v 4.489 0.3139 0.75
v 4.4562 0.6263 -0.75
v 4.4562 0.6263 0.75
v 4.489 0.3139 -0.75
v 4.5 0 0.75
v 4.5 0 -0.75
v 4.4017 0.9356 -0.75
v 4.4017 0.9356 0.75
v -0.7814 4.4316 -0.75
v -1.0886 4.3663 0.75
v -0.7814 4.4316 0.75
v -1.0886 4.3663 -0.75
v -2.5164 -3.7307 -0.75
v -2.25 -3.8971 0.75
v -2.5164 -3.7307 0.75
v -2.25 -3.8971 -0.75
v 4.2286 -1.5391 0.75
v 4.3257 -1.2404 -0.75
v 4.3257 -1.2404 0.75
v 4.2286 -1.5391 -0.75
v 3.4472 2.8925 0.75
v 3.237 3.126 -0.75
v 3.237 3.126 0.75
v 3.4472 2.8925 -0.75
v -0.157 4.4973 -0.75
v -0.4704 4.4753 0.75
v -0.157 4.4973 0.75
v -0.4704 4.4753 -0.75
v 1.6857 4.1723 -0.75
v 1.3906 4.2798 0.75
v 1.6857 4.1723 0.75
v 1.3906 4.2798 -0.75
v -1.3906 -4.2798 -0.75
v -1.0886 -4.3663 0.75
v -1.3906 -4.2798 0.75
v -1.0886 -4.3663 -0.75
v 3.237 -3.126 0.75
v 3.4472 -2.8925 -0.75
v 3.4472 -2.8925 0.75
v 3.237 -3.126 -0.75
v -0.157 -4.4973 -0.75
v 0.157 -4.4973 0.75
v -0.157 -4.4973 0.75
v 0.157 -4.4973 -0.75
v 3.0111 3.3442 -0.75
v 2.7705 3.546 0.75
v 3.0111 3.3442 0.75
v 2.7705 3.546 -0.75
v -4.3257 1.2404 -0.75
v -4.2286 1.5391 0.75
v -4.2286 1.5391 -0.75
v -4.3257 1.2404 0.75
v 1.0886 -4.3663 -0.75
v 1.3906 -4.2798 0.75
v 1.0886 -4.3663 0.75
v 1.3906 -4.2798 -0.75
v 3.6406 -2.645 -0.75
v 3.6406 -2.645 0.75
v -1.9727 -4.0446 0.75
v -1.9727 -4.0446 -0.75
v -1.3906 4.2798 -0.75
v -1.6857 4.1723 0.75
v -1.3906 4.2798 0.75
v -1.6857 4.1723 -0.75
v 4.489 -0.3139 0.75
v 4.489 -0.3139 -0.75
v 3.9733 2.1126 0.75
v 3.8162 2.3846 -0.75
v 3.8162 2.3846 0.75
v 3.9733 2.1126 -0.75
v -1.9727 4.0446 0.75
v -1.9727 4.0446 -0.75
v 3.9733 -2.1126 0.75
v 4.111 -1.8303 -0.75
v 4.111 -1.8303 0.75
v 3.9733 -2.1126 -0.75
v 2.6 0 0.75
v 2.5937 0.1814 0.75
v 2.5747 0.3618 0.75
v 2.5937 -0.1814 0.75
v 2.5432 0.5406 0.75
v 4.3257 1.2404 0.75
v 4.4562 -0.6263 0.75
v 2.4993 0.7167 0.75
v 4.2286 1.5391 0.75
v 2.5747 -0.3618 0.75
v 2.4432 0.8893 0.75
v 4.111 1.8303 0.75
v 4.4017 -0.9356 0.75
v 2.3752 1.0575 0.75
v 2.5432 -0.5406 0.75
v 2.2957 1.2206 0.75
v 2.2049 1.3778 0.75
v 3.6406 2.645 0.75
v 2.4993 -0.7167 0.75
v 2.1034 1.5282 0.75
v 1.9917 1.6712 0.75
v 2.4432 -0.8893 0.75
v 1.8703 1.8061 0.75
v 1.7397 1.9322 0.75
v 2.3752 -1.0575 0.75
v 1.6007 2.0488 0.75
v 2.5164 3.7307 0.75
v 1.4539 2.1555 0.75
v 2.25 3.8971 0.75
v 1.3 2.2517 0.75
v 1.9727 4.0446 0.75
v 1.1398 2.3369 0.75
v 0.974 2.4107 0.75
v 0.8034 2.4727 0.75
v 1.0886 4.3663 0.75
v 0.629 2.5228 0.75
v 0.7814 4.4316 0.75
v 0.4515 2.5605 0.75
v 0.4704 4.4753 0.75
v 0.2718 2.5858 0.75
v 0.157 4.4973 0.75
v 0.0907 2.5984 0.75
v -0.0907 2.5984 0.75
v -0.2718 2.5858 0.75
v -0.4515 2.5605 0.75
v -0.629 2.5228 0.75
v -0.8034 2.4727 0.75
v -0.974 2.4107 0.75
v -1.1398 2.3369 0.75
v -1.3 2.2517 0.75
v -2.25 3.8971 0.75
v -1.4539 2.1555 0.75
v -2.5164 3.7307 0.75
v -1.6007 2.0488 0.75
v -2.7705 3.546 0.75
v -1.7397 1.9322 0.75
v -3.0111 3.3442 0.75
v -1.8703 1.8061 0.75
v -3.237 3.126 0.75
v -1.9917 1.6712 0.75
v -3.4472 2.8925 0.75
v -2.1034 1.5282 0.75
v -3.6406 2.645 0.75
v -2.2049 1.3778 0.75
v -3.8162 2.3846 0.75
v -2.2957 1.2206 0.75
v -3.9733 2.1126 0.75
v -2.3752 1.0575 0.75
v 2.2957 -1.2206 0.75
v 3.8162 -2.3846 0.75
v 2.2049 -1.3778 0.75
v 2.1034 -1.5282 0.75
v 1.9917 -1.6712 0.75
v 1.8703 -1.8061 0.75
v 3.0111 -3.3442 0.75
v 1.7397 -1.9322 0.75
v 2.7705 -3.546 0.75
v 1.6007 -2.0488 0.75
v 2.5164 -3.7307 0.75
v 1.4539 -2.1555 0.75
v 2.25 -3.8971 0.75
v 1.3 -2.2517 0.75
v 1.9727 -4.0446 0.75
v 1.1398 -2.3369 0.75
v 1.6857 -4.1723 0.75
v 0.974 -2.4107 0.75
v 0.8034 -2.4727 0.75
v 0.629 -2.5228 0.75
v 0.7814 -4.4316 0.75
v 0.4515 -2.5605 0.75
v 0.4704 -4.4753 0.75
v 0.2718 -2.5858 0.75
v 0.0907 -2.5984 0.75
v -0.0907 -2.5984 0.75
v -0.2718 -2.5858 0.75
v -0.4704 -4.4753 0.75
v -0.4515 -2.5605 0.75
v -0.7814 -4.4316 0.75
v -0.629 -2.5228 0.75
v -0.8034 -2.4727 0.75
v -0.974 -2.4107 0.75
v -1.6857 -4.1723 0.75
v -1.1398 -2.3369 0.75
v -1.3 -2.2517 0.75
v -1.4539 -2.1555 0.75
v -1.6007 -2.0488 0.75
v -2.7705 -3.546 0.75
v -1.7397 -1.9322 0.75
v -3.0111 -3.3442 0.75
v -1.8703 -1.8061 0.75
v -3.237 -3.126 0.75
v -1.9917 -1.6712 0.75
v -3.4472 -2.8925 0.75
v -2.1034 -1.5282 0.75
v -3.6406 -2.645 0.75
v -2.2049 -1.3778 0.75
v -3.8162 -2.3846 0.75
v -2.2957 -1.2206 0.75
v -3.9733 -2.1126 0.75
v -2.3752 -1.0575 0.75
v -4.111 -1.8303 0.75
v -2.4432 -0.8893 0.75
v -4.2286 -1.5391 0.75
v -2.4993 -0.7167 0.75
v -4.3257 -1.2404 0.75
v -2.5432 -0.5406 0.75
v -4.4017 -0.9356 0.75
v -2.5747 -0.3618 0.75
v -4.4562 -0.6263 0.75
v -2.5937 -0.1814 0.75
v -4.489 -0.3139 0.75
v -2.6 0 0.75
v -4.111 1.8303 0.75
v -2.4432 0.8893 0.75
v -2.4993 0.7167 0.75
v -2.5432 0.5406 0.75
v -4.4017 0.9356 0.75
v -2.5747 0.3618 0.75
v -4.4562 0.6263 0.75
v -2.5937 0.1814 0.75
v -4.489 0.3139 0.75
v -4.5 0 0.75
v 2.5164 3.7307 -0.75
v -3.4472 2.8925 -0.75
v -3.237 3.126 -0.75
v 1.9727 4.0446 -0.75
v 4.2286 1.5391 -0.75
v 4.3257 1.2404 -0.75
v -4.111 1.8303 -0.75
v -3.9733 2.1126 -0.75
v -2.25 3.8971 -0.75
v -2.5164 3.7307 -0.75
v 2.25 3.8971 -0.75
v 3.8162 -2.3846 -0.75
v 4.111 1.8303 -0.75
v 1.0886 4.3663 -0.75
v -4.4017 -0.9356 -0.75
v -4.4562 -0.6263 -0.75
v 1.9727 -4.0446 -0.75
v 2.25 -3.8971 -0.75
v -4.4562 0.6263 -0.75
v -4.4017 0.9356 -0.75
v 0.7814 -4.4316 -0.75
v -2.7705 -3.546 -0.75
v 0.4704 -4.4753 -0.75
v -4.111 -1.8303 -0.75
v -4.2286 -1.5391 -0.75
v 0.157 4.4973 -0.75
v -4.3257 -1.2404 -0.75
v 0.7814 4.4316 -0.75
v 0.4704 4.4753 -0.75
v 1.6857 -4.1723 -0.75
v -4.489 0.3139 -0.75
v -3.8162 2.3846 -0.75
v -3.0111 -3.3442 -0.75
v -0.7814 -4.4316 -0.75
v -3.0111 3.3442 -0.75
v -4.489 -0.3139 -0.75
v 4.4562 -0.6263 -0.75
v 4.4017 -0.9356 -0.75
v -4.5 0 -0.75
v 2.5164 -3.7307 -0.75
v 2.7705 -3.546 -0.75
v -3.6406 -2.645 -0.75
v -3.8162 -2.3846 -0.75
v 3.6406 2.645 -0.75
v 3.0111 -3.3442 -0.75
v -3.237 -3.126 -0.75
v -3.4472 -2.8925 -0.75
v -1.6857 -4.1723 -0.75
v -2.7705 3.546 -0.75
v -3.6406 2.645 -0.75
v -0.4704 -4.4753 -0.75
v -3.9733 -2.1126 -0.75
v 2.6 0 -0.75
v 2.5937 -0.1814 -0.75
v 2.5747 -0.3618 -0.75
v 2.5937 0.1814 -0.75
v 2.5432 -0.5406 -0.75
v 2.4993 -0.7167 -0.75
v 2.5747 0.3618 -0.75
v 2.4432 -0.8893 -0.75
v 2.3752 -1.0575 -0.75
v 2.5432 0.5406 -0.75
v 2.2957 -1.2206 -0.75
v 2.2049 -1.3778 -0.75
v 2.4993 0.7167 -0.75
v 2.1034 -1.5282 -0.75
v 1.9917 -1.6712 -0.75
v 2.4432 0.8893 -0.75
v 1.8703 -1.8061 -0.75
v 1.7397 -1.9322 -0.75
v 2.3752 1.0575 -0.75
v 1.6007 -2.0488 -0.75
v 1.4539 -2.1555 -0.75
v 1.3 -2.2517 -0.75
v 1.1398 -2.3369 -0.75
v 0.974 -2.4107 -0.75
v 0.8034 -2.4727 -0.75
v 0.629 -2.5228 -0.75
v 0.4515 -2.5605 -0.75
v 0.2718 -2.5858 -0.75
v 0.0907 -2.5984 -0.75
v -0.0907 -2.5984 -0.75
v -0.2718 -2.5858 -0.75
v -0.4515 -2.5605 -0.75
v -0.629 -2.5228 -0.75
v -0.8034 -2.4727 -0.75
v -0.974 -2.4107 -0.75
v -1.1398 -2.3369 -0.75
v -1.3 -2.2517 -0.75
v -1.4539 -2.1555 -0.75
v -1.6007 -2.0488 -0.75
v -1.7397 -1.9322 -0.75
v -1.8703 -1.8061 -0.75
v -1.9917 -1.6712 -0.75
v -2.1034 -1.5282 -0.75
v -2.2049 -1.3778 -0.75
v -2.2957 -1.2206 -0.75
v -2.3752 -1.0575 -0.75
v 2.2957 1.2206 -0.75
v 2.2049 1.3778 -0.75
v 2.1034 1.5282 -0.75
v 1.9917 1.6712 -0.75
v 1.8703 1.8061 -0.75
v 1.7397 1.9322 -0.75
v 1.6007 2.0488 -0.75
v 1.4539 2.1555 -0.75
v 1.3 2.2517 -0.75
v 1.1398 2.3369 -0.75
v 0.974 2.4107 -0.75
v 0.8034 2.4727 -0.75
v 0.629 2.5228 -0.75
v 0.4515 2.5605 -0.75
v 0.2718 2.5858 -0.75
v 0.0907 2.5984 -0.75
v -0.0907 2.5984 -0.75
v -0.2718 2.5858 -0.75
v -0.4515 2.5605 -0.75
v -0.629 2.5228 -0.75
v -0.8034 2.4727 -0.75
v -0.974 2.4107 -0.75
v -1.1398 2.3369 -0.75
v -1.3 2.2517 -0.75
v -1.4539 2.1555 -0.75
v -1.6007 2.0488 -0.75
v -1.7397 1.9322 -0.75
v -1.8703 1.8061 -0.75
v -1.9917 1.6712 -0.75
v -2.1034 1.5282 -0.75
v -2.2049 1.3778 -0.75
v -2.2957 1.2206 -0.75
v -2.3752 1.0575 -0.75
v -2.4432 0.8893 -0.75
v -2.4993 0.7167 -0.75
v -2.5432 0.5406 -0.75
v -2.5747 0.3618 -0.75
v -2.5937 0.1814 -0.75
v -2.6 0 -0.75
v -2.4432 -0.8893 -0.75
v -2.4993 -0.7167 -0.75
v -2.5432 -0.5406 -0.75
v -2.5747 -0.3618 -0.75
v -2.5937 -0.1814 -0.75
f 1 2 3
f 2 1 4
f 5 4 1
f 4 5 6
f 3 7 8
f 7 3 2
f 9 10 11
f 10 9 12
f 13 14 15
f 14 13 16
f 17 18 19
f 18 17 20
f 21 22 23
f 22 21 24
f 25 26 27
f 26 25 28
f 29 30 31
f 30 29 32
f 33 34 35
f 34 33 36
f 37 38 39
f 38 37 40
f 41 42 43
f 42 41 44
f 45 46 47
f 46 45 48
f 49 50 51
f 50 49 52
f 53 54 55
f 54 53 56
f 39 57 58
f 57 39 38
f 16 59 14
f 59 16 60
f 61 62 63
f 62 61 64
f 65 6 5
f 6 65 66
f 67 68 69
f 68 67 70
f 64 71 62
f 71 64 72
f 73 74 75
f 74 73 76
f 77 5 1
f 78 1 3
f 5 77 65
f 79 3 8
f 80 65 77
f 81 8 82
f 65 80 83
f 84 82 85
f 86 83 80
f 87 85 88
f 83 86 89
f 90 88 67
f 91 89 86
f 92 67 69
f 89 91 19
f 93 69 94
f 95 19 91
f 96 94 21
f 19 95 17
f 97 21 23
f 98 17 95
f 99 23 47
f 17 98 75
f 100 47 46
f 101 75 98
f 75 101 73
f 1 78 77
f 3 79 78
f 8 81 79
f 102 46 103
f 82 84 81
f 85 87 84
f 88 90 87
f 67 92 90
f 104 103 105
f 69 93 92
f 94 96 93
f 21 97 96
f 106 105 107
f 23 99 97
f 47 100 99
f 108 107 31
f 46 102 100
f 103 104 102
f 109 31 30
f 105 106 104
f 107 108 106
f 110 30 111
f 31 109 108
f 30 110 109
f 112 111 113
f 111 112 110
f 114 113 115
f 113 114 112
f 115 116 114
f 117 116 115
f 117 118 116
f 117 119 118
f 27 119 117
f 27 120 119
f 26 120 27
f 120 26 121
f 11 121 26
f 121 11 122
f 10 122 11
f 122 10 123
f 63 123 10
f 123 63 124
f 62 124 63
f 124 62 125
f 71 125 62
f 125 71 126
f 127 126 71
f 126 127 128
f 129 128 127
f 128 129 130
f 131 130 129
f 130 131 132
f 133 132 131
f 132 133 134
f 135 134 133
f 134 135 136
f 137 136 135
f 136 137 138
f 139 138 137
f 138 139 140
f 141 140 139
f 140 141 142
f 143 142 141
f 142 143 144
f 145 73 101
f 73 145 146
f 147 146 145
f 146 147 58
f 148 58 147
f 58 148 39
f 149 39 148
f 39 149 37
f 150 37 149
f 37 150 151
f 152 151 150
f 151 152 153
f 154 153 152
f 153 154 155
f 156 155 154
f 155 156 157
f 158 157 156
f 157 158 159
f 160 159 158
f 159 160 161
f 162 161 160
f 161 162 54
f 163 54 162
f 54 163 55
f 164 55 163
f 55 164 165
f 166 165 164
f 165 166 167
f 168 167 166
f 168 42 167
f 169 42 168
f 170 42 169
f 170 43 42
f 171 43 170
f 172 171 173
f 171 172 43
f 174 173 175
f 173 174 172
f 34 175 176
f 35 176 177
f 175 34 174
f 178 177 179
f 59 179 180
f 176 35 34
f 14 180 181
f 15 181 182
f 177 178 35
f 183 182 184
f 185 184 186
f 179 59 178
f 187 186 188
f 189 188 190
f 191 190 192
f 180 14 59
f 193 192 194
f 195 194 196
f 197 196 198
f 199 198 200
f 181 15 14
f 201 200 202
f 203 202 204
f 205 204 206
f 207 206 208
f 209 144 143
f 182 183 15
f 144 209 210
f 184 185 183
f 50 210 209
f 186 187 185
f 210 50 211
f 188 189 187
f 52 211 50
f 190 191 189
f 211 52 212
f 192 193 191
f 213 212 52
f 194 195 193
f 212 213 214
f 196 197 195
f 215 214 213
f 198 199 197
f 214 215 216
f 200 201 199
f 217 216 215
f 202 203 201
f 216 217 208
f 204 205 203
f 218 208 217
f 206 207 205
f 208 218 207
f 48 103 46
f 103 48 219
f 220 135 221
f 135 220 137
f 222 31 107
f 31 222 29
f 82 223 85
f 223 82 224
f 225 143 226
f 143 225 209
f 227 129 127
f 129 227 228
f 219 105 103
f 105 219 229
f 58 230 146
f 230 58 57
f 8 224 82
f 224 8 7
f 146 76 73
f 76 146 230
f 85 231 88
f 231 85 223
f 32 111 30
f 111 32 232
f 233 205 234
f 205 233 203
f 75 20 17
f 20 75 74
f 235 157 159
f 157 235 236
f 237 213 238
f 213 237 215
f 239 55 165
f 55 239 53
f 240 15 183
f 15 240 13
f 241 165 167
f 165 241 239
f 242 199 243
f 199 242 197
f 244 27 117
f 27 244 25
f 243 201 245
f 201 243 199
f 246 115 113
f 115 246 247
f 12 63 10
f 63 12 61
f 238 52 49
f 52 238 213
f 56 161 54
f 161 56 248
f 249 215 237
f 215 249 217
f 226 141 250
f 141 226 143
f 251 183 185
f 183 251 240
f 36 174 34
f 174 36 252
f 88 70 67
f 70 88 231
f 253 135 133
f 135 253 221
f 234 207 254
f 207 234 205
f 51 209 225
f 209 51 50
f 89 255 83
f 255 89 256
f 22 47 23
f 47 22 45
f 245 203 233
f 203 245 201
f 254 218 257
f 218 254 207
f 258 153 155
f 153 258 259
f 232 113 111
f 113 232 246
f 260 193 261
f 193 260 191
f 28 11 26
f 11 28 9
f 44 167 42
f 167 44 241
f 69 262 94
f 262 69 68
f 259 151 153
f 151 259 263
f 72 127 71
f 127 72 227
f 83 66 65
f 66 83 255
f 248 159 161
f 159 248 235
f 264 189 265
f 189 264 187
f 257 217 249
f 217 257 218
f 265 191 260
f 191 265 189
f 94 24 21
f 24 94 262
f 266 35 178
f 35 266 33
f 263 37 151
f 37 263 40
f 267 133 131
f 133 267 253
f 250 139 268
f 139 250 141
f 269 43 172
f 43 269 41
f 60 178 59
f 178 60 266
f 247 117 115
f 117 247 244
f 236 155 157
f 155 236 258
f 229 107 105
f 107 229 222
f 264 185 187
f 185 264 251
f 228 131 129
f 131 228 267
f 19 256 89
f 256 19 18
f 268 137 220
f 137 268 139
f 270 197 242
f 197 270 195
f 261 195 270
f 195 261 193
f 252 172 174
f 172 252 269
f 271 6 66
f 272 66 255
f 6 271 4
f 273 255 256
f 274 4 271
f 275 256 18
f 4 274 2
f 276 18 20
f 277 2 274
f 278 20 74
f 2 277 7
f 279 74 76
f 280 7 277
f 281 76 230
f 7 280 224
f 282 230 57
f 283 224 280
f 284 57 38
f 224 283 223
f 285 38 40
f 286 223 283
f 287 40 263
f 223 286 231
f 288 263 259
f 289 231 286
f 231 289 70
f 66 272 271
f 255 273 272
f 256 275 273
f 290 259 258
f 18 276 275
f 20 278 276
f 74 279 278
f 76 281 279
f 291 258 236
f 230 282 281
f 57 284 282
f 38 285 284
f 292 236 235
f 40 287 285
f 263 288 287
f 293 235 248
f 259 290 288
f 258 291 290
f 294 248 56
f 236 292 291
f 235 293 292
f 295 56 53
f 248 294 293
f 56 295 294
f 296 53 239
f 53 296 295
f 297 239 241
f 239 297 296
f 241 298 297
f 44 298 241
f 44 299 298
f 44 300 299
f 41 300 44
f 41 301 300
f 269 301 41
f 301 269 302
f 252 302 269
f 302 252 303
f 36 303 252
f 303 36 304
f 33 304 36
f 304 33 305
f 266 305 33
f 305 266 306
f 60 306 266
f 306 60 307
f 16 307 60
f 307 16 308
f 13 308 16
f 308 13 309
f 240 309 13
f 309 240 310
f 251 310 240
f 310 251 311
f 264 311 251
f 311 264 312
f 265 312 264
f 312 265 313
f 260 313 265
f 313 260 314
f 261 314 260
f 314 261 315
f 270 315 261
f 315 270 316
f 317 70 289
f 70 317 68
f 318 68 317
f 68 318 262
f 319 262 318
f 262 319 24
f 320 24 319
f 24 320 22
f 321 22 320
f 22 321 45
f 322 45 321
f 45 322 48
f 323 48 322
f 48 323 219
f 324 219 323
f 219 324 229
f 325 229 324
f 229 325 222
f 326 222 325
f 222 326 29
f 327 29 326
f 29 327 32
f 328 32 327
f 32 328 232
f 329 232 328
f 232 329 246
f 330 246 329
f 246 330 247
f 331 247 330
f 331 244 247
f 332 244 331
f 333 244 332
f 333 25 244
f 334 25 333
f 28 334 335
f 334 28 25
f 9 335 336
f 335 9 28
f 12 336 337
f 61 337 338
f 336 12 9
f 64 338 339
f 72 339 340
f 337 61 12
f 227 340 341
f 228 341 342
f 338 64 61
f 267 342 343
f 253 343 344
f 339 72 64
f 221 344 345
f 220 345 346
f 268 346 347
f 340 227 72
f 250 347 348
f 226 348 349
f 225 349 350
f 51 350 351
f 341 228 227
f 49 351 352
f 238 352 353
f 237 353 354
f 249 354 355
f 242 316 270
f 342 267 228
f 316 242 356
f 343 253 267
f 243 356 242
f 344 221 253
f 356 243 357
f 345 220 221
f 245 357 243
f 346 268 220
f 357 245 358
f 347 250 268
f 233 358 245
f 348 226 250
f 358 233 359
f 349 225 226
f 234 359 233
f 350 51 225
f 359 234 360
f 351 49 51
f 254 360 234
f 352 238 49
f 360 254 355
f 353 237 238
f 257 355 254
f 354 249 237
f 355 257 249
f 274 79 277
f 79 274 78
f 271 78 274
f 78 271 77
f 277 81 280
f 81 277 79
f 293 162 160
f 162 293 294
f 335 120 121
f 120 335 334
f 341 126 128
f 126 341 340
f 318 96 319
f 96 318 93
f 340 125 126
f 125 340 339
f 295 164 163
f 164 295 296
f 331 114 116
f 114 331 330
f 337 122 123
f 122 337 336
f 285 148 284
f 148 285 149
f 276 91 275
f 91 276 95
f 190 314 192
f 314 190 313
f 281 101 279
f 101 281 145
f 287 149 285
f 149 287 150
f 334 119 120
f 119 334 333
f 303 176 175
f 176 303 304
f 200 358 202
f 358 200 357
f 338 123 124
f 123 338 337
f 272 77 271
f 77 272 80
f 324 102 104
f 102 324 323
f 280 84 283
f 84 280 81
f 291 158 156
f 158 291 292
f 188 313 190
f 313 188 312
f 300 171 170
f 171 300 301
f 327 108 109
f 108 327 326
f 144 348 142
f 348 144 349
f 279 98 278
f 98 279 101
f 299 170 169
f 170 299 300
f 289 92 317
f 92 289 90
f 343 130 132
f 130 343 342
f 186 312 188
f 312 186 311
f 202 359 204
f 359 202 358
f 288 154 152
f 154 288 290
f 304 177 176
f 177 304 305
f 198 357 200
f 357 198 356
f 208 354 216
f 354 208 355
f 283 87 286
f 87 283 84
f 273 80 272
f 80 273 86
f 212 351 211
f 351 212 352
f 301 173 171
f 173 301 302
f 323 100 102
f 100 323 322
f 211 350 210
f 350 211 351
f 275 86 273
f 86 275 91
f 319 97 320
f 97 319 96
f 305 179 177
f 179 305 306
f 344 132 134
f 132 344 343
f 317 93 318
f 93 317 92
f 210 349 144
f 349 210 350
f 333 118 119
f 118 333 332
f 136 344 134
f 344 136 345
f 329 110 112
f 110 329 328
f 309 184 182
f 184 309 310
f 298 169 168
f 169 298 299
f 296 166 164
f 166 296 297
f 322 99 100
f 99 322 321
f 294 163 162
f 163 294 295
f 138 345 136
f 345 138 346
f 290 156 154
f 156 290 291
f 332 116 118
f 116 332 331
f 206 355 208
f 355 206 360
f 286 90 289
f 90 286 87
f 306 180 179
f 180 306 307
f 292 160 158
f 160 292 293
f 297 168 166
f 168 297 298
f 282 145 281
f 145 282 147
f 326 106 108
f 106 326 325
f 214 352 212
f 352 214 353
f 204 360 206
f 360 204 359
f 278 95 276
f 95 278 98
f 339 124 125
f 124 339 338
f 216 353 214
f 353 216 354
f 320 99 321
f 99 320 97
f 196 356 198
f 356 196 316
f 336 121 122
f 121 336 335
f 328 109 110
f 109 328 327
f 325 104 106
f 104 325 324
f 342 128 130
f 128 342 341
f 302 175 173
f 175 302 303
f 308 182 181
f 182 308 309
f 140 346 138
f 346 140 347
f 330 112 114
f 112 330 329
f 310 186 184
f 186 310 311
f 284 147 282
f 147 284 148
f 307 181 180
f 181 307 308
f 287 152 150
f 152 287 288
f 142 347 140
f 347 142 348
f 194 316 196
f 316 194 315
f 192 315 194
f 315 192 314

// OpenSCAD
$fn=90;
difference(){
    cylinder(1.5,d=9,center=true);
    cylinder(2.5,d=5.2,center=true);
}
